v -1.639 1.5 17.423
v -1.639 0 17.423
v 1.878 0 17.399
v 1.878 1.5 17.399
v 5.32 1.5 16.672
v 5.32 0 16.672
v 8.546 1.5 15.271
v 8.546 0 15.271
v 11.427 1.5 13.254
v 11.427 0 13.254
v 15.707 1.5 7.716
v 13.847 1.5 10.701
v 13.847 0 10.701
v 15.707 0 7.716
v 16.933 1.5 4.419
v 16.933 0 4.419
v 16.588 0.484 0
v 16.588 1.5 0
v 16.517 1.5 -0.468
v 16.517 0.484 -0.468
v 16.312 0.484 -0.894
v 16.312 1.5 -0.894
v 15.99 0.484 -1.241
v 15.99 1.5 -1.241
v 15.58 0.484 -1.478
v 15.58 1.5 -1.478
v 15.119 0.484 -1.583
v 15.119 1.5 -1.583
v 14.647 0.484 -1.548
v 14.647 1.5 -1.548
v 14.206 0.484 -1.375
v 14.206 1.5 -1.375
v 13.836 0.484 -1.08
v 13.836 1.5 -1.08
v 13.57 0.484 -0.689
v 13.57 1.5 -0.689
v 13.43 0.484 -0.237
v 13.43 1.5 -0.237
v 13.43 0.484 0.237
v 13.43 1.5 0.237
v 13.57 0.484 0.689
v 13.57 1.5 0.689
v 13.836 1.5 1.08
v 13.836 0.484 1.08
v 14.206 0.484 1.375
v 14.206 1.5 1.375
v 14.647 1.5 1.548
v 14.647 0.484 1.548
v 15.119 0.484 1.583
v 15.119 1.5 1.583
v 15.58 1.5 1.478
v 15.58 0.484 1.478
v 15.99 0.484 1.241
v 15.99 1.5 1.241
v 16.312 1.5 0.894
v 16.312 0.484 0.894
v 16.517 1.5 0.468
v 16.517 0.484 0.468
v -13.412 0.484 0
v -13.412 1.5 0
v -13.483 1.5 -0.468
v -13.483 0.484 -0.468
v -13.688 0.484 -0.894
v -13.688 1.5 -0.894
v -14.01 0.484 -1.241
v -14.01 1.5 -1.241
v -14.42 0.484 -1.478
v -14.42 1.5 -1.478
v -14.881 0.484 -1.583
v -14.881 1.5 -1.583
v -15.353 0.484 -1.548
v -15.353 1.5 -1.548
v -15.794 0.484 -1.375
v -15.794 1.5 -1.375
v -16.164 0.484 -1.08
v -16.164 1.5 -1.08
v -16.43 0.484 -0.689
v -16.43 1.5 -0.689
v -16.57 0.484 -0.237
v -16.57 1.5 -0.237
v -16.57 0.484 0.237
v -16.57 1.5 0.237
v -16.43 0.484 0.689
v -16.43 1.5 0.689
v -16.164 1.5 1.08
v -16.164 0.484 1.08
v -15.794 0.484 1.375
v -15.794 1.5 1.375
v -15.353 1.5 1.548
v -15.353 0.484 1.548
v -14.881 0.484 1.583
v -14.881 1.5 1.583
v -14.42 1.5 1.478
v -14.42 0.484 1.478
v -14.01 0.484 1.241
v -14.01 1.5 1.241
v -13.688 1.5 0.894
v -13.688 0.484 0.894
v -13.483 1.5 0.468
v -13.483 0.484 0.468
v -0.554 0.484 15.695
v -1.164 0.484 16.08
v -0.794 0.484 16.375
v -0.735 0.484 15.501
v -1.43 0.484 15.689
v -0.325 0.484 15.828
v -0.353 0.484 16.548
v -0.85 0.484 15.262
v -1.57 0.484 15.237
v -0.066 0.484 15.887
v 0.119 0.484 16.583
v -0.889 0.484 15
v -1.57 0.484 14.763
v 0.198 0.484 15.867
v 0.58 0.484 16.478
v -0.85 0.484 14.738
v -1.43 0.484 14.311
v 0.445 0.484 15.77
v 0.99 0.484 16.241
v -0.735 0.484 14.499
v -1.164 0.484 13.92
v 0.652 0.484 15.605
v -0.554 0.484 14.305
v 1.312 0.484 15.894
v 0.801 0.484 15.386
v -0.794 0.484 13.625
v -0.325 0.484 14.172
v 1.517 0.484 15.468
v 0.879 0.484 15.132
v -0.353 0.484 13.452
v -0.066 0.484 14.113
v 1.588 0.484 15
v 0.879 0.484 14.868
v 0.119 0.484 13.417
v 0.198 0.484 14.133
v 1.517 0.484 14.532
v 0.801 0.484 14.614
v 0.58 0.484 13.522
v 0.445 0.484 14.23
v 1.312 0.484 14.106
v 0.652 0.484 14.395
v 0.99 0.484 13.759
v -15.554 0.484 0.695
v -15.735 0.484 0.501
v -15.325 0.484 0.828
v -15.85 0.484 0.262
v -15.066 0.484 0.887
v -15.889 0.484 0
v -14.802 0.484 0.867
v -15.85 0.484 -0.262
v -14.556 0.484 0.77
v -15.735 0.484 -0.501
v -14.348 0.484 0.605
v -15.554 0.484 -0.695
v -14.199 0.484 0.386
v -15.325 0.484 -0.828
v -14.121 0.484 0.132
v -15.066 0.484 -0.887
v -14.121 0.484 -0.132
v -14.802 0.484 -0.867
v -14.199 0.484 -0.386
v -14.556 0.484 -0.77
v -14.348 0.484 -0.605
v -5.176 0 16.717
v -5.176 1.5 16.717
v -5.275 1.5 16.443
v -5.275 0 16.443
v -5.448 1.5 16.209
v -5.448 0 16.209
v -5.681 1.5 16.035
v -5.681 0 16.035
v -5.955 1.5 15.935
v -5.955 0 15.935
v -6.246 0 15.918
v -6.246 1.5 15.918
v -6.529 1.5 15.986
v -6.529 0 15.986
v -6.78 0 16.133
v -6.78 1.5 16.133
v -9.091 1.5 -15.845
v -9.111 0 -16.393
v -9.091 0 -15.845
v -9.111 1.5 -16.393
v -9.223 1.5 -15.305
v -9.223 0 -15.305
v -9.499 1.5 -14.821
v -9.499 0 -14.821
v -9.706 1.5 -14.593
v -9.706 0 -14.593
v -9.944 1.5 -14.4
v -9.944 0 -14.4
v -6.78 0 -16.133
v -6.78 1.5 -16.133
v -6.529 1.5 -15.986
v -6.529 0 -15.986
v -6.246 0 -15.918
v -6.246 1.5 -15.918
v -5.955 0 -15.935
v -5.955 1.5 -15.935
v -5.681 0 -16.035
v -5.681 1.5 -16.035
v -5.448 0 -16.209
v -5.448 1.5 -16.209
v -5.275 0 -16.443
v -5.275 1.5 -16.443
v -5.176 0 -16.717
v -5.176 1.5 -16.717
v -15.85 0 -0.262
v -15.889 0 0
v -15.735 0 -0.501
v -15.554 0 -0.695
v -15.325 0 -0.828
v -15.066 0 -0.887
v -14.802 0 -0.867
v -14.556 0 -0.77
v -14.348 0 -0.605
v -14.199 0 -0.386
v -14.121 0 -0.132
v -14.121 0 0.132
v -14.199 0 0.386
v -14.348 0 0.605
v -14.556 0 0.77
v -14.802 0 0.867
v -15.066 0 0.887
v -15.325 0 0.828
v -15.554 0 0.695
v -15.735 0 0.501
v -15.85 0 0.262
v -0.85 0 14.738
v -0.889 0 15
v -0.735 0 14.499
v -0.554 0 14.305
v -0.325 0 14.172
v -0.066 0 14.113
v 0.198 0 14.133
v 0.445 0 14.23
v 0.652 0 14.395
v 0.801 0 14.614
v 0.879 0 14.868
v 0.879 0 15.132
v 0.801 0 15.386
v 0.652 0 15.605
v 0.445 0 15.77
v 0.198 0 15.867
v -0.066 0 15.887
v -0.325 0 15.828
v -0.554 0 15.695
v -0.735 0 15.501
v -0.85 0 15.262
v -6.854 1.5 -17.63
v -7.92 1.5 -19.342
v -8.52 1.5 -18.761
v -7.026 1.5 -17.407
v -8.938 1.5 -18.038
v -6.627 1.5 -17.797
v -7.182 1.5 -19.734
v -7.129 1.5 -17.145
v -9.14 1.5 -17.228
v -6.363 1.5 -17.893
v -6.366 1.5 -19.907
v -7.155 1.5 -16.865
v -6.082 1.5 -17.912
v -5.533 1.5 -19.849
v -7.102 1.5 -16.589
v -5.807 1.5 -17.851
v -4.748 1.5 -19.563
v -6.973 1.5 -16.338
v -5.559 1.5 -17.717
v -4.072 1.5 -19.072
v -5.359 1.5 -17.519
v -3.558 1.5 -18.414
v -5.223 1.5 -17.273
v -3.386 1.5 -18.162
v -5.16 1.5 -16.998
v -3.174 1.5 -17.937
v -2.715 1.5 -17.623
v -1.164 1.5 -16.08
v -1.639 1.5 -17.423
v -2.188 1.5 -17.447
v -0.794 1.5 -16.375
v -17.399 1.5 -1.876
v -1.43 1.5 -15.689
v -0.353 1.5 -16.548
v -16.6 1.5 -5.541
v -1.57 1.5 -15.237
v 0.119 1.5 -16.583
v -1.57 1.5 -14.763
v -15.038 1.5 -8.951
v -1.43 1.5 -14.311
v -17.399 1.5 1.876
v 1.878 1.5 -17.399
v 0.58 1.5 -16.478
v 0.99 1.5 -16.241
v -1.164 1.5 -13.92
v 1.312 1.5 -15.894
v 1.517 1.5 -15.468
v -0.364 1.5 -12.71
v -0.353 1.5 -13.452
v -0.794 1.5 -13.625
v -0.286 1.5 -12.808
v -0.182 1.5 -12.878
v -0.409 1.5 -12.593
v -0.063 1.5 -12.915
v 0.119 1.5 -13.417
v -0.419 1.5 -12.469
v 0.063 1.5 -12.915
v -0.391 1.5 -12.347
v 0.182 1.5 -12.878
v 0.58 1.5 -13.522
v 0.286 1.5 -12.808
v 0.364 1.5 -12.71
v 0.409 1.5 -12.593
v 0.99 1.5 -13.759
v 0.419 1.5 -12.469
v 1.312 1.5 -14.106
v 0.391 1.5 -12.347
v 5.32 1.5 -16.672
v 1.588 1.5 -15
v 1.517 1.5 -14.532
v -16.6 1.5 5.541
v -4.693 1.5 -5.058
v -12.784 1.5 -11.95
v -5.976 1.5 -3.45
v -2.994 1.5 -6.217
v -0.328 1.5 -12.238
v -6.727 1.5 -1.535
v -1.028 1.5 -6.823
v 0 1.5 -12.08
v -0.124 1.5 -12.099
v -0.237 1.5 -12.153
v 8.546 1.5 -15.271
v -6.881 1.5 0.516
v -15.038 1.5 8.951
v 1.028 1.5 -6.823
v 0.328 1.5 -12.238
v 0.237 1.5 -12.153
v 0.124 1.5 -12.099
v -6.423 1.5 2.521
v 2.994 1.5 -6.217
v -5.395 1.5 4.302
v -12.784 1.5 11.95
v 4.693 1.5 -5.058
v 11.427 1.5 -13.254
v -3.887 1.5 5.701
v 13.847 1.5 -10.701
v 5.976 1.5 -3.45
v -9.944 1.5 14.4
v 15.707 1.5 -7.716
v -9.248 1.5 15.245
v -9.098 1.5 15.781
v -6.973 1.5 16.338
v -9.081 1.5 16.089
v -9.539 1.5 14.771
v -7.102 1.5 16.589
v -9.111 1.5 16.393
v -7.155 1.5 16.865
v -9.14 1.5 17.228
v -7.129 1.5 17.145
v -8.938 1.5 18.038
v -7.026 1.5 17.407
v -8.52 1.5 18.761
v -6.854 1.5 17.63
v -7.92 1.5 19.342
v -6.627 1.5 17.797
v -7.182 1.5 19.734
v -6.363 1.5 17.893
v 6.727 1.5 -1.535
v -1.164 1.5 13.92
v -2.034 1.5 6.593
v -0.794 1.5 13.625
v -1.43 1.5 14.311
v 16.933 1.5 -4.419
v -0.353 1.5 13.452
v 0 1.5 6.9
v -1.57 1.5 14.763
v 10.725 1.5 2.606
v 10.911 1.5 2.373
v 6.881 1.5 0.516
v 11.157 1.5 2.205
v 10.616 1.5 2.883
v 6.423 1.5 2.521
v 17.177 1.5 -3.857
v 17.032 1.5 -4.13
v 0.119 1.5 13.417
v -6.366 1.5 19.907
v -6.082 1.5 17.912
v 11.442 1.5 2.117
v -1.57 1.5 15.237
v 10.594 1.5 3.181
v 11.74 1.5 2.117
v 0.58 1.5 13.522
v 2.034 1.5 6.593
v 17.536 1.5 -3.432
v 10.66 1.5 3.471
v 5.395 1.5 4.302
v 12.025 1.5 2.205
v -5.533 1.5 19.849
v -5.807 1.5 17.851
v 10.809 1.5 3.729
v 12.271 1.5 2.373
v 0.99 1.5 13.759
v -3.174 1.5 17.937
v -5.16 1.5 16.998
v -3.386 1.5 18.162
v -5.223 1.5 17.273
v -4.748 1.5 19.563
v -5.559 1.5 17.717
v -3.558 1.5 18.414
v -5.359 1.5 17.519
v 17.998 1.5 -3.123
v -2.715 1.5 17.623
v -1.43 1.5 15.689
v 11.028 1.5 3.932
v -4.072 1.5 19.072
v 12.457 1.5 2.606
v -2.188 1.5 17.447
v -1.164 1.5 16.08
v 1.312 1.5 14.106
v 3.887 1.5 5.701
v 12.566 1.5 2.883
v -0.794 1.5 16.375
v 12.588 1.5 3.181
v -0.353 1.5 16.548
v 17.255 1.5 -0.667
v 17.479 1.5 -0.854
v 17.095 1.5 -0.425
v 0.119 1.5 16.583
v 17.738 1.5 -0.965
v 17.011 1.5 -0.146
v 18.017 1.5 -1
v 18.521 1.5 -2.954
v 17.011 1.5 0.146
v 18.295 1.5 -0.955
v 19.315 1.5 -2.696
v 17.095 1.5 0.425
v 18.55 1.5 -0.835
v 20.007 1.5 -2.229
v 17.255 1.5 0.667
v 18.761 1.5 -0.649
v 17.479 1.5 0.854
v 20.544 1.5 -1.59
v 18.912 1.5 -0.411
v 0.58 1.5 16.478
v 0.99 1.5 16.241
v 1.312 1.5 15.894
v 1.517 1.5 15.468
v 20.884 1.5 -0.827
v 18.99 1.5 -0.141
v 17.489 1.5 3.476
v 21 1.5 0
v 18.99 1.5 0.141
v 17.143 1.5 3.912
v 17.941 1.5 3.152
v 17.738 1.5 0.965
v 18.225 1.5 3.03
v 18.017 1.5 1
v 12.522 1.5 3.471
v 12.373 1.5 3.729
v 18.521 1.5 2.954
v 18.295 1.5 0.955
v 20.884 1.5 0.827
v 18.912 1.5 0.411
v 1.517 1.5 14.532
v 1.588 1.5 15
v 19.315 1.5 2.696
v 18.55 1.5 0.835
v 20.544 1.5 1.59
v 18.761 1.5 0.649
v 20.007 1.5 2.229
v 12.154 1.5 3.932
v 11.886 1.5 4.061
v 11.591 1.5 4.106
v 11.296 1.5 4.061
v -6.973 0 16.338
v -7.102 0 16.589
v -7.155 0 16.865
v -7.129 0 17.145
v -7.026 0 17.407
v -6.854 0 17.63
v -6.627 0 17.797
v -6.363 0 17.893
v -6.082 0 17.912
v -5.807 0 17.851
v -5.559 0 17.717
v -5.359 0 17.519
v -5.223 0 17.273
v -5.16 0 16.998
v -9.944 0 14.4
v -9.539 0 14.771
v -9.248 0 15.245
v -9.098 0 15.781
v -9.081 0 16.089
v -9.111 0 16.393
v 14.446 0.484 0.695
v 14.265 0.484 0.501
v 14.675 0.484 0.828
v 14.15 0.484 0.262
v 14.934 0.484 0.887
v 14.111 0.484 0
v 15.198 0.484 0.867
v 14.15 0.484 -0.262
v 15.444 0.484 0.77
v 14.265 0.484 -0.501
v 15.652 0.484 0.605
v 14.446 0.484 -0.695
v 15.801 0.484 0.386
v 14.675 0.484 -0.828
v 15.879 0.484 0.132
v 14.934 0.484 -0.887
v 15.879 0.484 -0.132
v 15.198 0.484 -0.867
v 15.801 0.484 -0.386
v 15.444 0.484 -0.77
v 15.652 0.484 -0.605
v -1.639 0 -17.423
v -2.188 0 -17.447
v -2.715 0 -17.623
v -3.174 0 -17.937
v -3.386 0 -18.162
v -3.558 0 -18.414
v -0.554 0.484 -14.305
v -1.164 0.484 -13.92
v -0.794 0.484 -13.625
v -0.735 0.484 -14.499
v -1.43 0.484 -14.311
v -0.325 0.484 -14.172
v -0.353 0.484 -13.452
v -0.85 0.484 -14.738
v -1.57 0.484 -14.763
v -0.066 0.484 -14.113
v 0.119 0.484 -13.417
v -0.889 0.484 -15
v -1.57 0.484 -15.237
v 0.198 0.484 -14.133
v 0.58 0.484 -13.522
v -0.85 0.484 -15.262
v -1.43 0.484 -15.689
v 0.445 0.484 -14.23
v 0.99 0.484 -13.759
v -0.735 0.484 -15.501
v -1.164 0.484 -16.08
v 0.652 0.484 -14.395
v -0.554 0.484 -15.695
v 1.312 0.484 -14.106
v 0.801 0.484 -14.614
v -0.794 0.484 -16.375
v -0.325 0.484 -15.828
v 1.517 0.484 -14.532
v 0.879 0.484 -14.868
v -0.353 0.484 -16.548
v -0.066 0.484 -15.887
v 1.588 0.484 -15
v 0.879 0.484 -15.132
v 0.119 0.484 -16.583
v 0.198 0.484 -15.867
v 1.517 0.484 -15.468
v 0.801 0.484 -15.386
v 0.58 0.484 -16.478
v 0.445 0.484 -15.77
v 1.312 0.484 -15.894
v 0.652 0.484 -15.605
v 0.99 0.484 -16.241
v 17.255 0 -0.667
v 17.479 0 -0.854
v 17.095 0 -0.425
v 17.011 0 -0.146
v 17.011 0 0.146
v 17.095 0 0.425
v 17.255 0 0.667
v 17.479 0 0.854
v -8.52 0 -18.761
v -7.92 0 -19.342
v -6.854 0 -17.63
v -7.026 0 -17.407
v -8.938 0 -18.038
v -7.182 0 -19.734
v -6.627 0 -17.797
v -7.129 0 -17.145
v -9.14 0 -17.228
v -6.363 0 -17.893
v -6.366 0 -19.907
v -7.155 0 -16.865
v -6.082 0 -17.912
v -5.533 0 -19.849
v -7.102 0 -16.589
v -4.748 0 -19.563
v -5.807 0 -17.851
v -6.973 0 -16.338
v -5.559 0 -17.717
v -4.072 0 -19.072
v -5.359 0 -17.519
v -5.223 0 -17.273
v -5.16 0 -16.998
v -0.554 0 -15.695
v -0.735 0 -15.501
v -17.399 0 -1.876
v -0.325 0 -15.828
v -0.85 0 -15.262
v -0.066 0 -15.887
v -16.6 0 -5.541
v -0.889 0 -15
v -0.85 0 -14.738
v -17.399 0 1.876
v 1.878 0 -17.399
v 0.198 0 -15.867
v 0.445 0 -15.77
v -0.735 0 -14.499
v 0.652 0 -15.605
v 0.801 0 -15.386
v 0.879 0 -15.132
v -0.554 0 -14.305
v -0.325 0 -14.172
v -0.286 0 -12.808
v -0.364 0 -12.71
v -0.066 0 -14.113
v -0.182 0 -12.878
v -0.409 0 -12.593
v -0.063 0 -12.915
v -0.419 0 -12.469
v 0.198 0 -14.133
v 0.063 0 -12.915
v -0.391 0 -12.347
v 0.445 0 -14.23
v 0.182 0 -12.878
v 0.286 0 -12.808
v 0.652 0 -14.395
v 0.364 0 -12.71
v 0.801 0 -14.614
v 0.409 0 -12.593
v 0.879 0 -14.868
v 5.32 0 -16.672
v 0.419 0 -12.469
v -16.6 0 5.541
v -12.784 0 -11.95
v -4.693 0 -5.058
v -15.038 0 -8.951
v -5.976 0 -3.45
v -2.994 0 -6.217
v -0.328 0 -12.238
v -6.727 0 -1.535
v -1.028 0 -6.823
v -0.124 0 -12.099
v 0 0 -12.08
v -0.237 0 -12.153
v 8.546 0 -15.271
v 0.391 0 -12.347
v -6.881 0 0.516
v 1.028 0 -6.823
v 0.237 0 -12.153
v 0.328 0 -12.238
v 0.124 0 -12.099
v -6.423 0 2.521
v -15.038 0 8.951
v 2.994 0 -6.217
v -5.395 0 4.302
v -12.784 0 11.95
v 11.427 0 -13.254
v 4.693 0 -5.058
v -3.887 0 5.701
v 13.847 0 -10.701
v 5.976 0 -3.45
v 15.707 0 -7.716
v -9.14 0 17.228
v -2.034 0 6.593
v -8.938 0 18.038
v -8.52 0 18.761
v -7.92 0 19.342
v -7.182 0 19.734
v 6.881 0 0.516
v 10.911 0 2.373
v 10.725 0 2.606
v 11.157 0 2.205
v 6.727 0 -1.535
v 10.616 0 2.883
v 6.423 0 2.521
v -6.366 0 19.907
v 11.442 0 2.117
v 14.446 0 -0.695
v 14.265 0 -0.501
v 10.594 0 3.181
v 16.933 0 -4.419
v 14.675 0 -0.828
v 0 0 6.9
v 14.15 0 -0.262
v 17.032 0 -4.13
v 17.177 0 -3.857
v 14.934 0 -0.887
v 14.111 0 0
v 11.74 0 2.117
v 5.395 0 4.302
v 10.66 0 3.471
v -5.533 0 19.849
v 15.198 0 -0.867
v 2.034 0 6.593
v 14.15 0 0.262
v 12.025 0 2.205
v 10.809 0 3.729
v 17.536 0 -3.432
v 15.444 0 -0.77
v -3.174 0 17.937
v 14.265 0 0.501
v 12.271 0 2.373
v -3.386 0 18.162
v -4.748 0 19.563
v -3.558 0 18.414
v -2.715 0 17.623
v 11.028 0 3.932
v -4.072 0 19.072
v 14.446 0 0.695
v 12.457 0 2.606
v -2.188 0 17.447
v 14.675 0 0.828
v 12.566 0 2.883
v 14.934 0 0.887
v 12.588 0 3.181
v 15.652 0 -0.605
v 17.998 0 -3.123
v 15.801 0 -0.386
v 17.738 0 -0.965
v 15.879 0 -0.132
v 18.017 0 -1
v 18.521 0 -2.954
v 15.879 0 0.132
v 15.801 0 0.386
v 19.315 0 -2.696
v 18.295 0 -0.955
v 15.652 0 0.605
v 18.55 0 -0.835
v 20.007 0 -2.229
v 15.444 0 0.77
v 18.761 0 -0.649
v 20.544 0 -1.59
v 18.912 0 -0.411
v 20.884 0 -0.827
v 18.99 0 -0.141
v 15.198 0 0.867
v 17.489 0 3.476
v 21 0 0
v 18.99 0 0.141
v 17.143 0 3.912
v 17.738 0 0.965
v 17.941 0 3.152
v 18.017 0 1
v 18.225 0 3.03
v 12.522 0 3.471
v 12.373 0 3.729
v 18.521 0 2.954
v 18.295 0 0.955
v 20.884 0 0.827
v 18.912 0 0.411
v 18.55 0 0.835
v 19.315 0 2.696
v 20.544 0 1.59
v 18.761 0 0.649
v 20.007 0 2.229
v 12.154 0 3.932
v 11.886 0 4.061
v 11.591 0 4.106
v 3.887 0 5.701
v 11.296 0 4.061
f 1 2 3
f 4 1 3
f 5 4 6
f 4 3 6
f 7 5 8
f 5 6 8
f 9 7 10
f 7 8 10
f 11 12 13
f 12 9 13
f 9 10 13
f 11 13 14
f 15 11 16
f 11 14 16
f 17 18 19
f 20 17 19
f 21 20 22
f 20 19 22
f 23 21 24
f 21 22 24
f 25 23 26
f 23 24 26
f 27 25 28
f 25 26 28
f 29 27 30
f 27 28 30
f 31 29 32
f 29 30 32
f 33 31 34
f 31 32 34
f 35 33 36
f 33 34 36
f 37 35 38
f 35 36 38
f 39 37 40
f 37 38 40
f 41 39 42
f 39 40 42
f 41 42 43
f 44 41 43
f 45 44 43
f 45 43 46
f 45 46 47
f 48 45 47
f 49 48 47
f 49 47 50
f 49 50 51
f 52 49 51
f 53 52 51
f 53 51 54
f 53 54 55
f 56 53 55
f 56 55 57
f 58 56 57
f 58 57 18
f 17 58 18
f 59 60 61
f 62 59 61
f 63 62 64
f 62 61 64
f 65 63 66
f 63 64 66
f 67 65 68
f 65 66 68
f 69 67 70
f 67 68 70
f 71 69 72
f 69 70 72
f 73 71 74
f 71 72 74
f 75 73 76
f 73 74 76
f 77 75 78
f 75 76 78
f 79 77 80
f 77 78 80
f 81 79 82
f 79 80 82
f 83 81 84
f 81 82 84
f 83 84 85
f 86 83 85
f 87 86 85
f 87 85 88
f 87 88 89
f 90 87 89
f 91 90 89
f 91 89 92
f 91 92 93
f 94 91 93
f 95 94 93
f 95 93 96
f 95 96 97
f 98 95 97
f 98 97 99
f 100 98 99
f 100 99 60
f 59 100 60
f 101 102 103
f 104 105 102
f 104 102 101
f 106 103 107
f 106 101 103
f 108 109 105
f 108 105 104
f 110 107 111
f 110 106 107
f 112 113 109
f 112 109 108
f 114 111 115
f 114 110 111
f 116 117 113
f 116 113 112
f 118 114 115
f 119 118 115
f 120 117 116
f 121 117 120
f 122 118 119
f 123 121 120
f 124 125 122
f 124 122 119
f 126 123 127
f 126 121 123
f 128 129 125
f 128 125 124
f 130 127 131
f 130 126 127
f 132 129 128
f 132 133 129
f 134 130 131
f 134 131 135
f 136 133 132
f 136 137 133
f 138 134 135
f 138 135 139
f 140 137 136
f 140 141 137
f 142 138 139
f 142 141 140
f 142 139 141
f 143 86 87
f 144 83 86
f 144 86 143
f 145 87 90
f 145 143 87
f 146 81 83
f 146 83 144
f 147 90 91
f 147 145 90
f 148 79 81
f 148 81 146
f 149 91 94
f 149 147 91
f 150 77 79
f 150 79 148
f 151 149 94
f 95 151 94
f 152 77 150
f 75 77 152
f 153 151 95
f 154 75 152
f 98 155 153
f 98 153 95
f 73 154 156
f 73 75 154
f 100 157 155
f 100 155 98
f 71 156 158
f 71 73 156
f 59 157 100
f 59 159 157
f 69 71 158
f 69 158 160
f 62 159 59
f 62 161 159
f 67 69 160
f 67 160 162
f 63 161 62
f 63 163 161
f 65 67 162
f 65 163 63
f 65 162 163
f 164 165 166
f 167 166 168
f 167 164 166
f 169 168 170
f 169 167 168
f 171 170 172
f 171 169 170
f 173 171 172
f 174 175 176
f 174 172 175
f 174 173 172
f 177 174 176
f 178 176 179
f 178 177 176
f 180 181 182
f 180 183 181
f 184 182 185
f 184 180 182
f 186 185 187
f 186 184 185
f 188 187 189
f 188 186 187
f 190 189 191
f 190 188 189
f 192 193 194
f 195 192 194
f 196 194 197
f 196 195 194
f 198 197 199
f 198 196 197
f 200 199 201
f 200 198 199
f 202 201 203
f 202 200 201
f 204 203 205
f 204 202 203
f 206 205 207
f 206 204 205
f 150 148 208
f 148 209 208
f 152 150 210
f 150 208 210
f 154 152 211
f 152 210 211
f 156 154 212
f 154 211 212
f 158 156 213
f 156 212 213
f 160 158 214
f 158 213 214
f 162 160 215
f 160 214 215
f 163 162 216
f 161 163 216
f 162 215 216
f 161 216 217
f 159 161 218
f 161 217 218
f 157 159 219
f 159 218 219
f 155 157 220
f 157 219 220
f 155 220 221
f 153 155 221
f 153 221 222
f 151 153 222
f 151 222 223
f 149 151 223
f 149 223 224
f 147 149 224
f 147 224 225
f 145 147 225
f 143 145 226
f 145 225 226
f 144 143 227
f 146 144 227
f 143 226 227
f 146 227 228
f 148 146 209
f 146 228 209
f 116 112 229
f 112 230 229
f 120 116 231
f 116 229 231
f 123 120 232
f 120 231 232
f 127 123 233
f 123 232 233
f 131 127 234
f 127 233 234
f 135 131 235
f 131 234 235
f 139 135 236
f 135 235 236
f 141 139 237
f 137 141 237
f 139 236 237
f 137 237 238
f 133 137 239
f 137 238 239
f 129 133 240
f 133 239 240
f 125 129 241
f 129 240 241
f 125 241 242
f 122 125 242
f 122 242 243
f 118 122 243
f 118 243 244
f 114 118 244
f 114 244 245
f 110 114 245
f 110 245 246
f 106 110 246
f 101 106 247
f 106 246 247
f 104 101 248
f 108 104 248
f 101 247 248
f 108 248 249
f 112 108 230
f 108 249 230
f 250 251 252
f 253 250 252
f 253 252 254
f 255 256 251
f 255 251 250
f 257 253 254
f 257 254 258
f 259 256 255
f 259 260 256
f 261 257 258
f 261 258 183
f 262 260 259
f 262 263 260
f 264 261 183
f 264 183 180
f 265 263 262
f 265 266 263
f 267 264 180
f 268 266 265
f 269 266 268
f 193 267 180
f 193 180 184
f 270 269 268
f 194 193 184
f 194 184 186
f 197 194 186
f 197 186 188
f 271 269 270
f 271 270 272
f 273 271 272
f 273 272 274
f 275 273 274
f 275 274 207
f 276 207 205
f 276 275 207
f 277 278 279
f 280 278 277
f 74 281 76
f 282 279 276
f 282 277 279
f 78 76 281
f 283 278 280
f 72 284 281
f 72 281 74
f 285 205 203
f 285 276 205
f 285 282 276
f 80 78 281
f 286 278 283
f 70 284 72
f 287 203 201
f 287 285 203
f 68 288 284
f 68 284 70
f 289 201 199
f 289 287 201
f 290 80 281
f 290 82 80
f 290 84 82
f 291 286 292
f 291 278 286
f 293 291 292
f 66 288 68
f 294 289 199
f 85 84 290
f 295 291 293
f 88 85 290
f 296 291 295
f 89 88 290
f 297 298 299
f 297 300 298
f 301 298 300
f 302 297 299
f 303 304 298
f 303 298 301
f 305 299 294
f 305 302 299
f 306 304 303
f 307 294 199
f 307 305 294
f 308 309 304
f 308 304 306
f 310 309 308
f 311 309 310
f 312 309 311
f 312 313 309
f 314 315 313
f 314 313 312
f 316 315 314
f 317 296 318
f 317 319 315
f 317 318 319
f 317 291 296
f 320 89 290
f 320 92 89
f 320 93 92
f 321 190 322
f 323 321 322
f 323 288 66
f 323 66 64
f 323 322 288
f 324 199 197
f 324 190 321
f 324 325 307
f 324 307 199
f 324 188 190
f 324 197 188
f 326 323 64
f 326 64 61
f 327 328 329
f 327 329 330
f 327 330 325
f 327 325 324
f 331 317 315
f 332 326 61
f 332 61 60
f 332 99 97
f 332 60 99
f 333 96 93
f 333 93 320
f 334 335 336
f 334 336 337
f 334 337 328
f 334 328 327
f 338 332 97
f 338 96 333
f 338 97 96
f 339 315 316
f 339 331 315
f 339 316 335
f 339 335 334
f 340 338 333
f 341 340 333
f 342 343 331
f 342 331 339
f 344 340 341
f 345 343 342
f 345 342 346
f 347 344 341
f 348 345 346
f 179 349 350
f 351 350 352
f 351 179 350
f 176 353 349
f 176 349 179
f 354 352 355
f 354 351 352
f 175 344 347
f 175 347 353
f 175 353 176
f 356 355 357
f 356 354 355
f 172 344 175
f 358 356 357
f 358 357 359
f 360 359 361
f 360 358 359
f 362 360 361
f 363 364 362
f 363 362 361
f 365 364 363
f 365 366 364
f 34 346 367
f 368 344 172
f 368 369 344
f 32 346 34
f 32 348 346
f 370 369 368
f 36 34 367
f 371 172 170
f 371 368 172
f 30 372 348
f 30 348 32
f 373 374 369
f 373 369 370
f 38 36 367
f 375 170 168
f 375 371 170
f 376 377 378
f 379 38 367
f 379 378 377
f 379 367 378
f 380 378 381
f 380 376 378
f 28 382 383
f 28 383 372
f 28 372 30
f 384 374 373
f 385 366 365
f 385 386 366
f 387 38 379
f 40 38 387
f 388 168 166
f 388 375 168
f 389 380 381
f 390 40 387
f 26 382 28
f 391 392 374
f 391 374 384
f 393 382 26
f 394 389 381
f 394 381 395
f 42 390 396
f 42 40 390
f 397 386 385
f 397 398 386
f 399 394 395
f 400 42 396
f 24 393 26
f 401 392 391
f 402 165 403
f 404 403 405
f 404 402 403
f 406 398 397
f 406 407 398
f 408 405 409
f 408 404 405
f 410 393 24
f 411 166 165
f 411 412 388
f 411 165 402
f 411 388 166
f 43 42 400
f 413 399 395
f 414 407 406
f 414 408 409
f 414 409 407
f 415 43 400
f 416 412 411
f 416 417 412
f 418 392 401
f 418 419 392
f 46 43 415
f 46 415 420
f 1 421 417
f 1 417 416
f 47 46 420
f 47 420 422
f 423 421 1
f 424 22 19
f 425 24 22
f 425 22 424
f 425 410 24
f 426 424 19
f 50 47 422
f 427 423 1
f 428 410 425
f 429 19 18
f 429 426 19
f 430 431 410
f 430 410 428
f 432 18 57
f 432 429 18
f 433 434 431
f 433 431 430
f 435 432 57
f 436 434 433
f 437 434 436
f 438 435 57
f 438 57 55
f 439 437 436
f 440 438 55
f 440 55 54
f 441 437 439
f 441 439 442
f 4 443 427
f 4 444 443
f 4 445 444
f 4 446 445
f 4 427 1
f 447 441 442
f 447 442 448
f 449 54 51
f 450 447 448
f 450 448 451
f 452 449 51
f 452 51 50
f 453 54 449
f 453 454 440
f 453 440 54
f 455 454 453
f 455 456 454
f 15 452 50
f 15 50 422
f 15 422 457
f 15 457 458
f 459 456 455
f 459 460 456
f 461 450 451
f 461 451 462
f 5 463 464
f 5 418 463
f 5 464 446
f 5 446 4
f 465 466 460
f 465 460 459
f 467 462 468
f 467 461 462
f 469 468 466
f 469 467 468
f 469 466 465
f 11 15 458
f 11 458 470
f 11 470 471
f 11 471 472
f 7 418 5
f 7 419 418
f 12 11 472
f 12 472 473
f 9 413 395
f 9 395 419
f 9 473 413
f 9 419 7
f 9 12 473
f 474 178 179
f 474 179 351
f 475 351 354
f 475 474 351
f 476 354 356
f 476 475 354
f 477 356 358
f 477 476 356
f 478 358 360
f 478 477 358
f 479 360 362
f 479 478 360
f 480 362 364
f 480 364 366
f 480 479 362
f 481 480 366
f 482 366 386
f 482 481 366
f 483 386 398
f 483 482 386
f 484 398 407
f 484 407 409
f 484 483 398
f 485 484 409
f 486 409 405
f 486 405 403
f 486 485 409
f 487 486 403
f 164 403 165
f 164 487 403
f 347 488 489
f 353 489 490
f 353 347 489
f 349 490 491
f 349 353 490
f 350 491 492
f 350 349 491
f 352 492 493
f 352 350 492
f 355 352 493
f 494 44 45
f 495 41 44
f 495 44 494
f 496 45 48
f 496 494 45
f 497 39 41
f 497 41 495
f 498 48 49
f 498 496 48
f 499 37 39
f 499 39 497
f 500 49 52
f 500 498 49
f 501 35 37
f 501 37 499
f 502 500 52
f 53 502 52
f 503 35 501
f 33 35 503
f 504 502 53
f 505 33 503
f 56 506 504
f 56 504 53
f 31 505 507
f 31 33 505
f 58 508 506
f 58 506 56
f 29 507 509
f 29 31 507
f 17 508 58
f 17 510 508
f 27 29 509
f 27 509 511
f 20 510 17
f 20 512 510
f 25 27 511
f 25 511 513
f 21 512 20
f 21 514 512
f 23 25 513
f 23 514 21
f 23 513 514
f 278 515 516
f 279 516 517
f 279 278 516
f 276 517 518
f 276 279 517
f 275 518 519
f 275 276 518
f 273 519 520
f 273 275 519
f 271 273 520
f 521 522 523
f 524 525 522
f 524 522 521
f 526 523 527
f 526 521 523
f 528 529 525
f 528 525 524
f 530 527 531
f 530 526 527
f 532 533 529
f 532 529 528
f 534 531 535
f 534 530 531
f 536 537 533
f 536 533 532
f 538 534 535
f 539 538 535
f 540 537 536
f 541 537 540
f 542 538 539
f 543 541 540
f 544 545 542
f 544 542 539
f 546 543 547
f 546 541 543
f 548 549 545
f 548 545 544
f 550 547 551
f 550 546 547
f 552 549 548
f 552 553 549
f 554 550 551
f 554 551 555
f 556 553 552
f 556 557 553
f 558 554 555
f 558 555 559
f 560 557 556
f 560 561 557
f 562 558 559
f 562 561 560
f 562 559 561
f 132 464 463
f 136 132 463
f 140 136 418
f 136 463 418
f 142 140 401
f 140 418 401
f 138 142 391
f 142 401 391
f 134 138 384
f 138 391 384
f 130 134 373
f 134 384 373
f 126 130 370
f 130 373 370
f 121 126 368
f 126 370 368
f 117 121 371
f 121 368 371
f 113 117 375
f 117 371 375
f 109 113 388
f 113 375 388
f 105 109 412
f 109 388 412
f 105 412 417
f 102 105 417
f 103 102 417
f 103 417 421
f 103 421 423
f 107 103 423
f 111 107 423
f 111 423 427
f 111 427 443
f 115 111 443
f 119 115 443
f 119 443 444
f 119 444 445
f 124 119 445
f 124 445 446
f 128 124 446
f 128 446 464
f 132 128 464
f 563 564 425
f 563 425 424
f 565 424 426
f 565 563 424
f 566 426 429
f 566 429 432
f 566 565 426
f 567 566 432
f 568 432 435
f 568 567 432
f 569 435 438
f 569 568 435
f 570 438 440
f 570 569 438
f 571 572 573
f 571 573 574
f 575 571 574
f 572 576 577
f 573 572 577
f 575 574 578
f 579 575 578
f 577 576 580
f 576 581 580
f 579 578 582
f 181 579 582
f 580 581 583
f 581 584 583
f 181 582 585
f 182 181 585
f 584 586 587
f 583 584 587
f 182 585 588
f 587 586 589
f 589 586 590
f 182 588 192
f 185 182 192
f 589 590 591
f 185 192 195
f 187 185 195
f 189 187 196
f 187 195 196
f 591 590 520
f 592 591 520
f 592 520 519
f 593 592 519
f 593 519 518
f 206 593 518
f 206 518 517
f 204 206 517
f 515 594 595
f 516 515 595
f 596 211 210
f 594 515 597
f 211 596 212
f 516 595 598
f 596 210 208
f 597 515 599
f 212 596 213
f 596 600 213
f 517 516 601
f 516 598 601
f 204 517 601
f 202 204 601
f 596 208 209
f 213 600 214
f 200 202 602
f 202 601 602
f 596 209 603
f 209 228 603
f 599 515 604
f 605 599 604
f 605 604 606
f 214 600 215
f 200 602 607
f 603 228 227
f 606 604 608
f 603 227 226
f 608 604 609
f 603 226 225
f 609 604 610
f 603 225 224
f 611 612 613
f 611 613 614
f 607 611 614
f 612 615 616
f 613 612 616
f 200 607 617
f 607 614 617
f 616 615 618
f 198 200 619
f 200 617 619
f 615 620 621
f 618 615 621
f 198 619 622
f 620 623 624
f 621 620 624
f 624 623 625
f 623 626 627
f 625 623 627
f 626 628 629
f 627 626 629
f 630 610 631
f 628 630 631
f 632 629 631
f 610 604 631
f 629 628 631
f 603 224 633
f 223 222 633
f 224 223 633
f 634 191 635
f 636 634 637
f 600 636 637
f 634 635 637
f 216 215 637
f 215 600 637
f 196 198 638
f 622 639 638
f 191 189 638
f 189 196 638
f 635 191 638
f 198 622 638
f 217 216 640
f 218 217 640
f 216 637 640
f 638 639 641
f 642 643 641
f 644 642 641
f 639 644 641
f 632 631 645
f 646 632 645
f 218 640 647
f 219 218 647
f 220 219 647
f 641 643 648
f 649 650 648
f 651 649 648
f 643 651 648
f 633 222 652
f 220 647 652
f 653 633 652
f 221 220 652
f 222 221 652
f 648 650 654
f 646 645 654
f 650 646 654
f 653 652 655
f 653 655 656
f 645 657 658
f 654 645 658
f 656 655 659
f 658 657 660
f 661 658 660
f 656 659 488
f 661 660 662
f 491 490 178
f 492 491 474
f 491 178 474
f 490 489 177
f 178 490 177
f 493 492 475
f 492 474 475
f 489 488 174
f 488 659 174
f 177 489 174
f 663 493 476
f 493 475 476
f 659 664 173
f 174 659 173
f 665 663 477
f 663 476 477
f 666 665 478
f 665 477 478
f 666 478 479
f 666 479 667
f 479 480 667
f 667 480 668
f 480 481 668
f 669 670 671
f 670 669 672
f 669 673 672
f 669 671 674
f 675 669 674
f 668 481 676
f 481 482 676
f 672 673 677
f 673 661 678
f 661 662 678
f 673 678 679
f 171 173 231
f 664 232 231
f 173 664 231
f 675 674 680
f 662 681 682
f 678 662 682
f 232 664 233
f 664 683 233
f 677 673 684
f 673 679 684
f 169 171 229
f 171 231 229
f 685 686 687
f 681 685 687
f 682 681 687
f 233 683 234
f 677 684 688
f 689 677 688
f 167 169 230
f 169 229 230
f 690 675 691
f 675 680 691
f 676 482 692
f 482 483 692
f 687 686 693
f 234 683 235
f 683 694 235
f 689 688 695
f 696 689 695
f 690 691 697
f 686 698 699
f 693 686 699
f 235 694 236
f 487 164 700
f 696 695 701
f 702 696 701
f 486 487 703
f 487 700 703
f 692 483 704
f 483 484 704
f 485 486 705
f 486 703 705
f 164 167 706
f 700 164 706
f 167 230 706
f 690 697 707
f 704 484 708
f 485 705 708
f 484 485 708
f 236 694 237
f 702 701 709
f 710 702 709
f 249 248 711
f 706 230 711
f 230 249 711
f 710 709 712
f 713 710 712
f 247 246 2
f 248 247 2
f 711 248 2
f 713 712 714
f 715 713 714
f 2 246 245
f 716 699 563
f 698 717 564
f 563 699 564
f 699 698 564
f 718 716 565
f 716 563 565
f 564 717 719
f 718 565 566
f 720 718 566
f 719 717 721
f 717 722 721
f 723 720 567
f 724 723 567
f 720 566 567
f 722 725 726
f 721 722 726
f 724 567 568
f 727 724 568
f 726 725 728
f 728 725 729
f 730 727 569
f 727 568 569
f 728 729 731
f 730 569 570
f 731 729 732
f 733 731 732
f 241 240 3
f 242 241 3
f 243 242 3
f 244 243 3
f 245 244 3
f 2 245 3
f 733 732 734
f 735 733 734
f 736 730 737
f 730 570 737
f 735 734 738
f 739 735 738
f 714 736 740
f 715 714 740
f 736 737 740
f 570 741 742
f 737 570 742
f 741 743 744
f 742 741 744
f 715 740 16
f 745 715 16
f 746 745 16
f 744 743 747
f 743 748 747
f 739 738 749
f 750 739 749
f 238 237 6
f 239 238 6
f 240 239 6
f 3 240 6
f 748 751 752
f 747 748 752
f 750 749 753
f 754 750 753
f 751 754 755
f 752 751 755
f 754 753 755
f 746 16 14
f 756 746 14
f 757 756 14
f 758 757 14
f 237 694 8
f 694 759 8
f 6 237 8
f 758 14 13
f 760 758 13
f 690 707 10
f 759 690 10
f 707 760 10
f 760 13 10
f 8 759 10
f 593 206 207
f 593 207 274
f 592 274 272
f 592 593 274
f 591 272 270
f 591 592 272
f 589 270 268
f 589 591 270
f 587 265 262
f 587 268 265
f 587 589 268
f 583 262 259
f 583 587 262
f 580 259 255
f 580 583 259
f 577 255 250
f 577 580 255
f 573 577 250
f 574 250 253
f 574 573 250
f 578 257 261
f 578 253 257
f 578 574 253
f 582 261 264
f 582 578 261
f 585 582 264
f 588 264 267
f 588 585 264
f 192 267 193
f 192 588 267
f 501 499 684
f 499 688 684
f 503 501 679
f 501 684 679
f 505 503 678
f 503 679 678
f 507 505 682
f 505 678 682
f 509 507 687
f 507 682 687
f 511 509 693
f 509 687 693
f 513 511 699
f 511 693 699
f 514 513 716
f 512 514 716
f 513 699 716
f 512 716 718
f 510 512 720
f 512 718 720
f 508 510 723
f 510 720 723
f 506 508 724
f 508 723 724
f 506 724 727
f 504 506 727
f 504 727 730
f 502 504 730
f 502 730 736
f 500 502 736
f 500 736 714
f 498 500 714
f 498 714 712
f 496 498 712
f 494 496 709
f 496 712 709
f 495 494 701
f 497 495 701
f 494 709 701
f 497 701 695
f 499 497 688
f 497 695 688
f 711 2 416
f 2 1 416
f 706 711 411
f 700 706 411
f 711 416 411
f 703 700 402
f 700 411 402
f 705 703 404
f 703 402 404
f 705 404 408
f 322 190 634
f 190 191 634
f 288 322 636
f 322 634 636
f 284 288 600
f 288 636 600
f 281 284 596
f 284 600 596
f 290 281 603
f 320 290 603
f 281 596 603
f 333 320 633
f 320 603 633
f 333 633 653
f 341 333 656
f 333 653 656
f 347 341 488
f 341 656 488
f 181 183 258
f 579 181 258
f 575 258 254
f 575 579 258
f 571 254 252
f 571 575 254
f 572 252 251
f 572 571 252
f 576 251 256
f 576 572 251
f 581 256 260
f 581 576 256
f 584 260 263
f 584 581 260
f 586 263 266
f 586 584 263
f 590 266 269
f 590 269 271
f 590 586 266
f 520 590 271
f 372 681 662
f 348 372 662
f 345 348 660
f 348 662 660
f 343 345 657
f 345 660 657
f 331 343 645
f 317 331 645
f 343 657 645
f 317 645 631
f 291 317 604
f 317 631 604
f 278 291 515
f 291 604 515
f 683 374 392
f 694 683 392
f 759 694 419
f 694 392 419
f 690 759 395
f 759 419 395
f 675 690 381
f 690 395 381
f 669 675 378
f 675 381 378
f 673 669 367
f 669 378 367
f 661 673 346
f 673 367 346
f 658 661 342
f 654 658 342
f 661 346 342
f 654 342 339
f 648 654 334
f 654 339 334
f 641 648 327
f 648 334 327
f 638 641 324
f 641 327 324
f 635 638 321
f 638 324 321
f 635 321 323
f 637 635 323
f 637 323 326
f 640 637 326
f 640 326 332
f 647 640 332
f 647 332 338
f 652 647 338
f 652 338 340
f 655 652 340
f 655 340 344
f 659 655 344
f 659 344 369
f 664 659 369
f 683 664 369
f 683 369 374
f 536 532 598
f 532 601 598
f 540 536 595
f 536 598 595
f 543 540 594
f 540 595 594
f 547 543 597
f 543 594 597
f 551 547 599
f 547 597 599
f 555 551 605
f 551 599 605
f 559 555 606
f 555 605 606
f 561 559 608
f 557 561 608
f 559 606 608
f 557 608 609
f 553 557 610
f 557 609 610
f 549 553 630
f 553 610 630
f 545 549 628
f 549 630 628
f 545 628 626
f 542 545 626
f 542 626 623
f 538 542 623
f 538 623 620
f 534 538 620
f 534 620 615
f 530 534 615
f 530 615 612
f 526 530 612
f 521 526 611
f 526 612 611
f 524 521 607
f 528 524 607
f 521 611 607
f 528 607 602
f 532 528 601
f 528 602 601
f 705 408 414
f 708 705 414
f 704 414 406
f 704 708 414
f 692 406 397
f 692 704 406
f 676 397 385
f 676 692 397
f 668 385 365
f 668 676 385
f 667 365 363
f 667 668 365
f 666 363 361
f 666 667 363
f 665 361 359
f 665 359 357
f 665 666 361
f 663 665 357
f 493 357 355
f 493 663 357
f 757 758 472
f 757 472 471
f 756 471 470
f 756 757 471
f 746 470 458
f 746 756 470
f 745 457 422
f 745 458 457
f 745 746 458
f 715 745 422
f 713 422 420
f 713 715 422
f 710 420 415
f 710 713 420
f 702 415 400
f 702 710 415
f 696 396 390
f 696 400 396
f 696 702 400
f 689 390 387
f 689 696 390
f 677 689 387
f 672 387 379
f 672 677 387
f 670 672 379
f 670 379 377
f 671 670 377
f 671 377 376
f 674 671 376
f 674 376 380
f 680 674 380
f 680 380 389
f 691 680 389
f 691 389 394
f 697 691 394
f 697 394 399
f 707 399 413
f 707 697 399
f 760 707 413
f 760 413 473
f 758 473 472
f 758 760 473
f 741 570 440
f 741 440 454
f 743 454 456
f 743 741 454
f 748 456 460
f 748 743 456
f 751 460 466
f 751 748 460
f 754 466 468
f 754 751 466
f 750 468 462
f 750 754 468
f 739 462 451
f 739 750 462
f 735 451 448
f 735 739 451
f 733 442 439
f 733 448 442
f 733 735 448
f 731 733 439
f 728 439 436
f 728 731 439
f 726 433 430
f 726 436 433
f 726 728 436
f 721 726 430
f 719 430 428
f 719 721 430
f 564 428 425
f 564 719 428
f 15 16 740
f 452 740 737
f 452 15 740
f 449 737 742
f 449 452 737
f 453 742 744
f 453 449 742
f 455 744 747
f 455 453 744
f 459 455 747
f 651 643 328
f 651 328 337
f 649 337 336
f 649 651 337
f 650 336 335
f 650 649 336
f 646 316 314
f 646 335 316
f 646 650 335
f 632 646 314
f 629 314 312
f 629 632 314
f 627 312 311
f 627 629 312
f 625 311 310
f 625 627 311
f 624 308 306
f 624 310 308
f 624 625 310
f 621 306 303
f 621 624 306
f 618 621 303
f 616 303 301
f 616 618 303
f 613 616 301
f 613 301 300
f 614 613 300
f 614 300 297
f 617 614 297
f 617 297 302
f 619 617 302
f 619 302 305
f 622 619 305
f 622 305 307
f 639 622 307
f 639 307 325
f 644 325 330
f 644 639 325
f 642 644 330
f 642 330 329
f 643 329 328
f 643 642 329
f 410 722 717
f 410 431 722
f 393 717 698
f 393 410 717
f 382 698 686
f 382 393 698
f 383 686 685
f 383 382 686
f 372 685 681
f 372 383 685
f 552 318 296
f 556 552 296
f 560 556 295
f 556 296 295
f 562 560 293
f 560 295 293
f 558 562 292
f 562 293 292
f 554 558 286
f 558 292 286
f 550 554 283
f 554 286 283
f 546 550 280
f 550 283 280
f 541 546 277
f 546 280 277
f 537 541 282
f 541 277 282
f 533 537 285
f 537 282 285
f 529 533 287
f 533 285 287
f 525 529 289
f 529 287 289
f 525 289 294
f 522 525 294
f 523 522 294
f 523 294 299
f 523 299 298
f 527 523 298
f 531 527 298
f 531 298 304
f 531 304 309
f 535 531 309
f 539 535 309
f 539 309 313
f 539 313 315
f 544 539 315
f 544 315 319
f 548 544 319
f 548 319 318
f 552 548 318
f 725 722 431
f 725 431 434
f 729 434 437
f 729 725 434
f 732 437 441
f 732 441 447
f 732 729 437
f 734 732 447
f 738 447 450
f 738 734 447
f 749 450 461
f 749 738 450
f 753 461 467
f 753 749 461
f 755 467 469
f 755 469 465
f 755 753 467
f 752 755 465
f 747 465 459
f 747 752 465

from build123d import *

# Parameters (mm, degrees)
SKETCH1_R                                      = 17.5
BOSS_EXTRUDE1_DEPTH                            = 1.5
CUT_EXTRUDE1_DEPTH                             = 25.794152536
CUT_EXTRUDE1_DEPTH_BACK                        = 25.794152536
SKETCH6_R                                      = 0.42
SKETCH6_R_2                                    = 1
CBORE_FOR_0_SOCKET_HEAD_CAP_SCREW1_D           = 1.778
CBORE_FOR_0_SOCKET_HEAD_CAP_SCREW1_CBORE_D     = 3.175
CBORE_FOR_0_SOCKET_HEAD_CAP_SCREW1_CBORE_DEPTH = 1.016
BOSS_EXTRUDE2_DEPTH                            = 1.5
FILLET1_R                                      = 2
CUT_EXTRUDE2_START                             = -10
SKETCH10_R                                     = 1
CUT_EXTRUDE2_DEPTH                             = 10
SKETCH11_R                                     = 6.9
CUT_EXTRUDE3_DEPTH                             = 10


with BuildPart() as part:
    # Sketch1 → Boss-Extrude1 (new body)
    with BuildSketch(Plane(origin=(0, 0, 0), x_dir=(1, 0, 0), z_dir=(0, 1, 0))):
        with Locations(Location((0, 0, 0), (0, 0, 270))):
            Circle(SKETCH1_R)
    extrude(amount=BOSS_EXTRUDE1_DEPTH)

    # Sketch6 → Cut-Extrude1 (cut, two sides: drawn at the far end of the back side and taken through both)
    with BuildSketch(Plane(origin=(0, 1.5, 0), x_dir=(1, 0, 0), z_dir=(0, 1, 0)).offset(-CUT_EXTRUDE1_DEPTH_BACK)):
        with Locations(Location((0, 12.5, 0), (0, 0, 270))):
            Circle(SKETCH6_R)
        with Locations(Location((11.591109915, -3.105828541, 0), (0, 0, 270))):
            Circle(SKETCH6_R_2)
    extrude(amount=CUT_EXTRUDE1_DEPTH + CUT_EXTRUDE1_DEPTH_BACK, mode=Mode.SUBTRACT)

    # CBORE for #0 Socket Head Cap Screw1 (through all)
    with Locations(Plane(origin=(0, 1.5, 0), x_dir=(1, 0, 0), z_dir=(0, 1, 0))):
        with Locations((0, 15), (-15, 0), (0, -15), (15, 0)):
            CounterBoreHole(CBORE_FOR_0_SOCKET_HEAD_CAP_SCREW1_D / 2, CBORE_FOR_0_SOCKET_HEAD_CAP_SCREW1_CBORE_D / 2, CBORE_FOR_0_SOCKET_HEAD_CAP_SCREW1_CBORE_DEPTH)

    # Sketch9 → Boss-Extrude2 (add)
    with BuildSketch(Plane.XZ):
        with BuildLine():
            ThreePointArc((-3.2615852, 17.702035532), (-7.18242301, 19.733545037), (-8.880129888, 15.657052506))
            Line((-8.880129888, 15.657052506), (-8.706640889, 15.180395398))
            ThreePointArc((-8.706640889, 15.180395398), (-7.758159345, 15.686330469), (-6.780403574, 16.133075571))
            ThreePointArc((-6.780403574, 16.133075571), (-6.498382723, 17.854159795), (-5.176050603, 16.717012297))
            ThreePointArc((-5.176050603, 16.717012297), (-4.139884011, 17.00327499), (-3.0880962, 17.225378424))
            Line((-3.0880962, 17.225378424), (-3.2615852, 17.702035532))
        make_face()
        with BuildLine():
            ThreePointArc((17.242752101, 2.989565186), (17.39377576, 1.925244093), (17.479166667, 0.853658385))
            ThreePointArc((17.479166667, 0.853658385), (19, 0), (17.479166667, -0.853658385))
            ThreePointArc((17.479166667, -0.853658385), (17.39377576, -1.925244093), (17.242752101, -2.989565186))
            Line((17.242752101, -2.989565186), (17.75, -2.989565186))
            ThreePointArc((17.75, -2.989565186), (21, 0), (17.75, 2.989565186))
            Line((17.75, 2.989565186), (17.242752101, 2.989565186))
        make_face()
        with BuildLine():
            ThreePointArc((-8.880129888, -15.657052506), (-7.18242301, -19.733545037), (-3.2615852, -17.702035532))
            Line((-3.2615852, -17.702035532), (-3.0880962, -17.225378424))
            ThreePointArc((-3.0880962, -17.225378424), (-4.139884011, -17.00327499), (-5.176050603, -16.717012297))
            ThreePointArc((-5.176050603, -16.717012297), (-6.498382723, -17.854159795), (-6.780403574, -16.133075571))
            ThreePointArc((-6.780403574, -16.133075571), (-7.758159345, -15.686330469), (-8.706640889, -15.180395398))
            Line((-8.706640889, -15.180395398), (-8.880129888, -15.657052506))
        make_face()
    extrude(amount=-BOSS_EXTRUDE2_DEPTH)

    # Fillet1
    fillet1_edges = [part.edges().sort_by_distance(p)[0] for p in [
        (17.242752101, 0.75, 2.989565186),
        (-3.0880962, 0.75, 17.225378424),
        (-8.706640889, 0.75, 15.180395398),
        (-8.706640889, 0.75, -15.180395398),
        (-3.0880962, 0.75, -17.225378424),
        (17.242752101, 0.75, -2.989565186),
    ]]
    fillet(fillet1_edges, radius=FILLET1_R)

    # Sketch10 → Cut-Extrude2 (cut)
    with BuildSketch(Plane(origin=(0, 1.5, 0), x_dir=(1, 0, 0), z_dir=(0, 1, 0)).offset(CUT_EXTRUDE2_START)):
        with Locations(Location((-6.15636258, 16.914467174, 0), (0, 0, 90))):
            Circle(SKETCH10_R)
        with Locations(Location((18, 0, 0), (0, 0, 90))):
            Circle(SKETCH10_R)
        with Locations(Location((-6.15636258, -16.914467174, 0), (0, 0, 90))):
            Circle(SKETCH10_R)
    extrude(amount=CUT_EXTRUDE2_DEPTH, mode=Mode.SUBTRACT)

    # Sketch11 → Cut-Extrude3 (cut)
    with BuildSketch(Plane(origin=(0, 1.5, 0), x_dir=(1, 0, 0), z_dir=(0, 1, 0))):
        with Locations(Location((0, 0, 0), (0, 0, 270))):
            Circle(SKETCH11_R)
    extrude(amount=-CUT_EXTRUDE3_DEPTH, mode=Mode.SUBTRACT)


solid = part.part
